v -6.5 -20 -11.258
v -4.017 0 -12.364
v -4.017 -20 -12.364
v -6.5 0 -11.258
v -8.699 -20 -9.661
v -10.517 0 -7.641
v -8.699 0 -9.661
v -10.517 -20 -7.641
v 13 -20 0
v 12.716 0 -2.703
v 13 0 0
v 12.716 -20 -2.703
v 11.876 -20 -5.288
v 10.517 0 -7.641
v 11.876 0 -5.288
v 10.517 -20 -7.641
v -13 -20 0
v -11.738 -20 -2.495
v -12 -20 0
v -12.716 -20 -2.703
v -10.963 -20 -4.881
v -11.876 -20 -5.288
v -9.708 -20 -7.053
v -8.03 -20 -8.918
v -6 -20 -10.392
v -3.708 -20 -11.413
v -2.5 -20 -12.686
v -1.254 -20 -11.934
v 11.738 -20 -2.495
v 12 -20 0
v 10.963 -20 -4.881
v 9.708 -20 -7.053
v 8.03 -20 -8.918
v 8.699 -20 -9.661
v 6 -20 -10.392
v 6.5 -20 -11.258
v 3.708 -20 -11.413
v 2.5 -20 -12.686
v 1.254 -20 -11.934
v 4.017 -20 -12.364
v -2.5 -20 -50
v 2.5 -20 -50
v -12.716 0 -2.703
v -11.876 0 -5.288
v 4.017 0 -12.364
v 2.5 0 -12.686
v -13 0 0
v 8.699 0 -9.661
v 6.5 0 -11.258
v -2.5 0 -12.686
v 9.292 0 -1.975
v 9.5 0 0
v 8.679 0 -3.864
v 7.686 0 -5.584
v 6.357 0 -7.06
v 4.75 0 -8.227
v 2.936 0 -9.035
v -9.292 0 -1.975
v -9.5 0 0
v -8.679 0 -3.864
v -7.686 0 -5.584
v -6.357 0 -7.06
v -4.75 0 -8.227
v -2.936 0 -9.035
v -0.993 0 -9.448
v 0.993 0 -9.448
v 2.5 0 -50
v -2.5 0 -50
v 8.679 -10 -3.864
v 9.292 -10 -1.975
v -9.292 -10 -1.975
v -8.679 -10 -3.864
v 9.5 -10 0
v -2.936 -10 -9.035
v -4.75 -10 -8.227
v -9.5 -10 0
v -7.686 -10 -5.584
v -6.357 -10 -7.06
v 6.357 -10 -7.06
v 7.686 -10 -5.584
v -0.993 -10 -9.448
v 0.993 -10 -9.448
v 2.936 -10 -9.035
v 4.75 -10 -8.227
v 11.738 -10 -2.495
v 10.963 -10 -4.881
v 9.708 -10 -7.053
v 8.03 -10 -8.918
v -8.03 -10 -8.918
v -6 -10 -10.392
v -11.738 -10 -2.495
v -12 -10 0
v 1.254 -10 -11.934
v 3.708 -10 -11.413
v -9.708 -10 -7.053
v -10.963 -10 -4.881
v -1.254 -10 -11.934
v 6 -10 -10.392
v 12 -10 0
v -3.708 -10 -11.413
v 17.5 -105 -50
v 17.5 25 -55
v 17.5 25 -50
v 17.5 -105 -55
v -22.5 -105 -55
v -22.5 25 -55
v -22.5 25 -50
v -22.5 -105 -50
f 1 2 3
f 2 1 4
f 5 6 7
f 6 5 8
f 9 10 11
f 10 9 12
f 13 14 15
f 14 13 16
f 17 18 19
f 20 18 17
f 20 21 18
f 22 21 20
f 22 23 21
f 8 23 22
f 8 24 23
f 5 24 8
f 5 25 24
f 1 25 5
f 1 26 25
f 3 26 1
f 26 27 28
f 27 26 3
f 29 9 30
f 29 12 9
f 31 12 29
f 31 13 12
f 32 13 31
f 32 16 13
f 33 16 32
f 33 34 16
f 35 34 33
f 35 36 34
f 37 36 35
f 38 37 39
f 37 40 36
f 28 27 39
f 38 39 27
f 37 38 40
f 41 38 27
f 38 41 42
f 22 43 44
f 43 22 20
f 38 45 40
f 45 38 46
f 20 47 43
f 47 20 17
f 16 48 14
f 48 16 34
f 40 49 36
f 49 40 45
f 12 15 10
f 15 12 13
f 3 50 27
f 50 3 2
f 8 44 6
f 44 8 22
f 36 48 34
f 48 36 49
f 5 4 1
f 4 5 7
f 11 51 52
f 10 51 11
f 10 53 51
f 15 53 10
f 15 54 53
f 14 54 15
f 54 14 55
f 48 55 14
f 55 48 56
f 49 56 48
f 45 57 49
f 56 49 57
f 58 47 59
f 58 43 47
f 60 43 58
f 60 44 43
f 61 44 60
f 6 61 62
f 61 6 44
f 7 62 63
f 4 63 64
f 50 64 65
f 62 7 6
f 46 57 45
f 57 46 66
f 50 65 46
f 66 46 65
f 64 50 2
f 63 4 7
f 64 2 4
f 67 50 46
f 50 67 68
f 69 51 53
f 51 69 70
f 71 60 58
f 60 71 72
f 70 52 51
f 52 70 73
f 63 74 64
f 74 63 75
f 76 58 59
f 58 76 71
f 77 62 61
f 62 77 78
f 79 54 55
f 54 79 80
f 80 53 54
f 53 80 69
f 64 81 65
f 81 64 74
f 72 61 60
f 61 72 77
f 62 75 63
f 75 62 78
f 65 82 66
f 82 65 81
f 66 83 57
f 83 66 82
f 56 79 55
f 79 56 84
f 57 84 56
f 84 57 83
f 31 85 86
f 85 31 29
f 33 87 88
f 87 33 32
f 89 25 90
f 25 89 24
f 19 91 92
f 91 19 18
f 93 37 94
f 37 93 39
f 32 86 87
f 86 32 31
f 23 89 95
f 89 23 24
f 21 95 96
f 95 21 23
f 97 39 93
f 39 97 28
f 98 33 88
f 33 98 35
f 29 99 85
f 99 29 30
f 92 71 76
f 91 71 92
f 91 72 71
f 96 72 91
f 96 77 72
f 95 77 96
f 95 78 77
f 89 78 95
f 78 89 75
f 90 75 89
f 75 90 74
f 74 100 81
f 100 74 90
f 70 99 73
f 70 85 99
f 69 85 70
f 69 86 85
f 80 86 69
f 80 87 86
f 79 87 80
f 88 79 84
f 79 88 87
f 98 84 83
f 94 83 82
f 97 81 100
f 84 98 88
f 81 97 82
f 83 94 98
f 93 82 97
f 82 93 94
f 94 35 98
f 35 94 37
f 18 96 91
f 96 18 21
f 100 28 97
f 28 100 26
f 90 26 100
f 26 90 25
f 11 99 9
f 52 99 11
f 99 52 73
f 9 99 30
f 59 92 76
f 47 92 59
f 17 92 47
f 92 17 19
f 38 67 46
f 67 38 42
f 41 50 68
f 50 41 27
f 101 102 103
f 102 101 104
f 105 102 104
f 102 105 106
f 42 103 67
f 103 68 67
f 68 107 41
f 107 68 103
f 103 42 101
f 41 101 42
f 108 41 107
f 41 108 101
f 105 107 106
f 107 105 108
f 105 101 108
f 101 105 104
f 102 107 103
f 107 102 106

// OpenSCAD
rotate([180,0,0]){
difference(){
    rotate([-90,0,0]){
        difference(){
            cylinder(20,13,13);
            cylinder(11,9.5,9.5);
            translate([0,0,10]){
                cylinder(11,12,12);
            }
           
        }
    }
    translate([-20,0,-40])
        cube(40);
}
translate([-2.5,0,12]){
    cube([5,20,40]);
}
translate([-22.5,-25,50]){
    cube([40,130,5]);
}
}
